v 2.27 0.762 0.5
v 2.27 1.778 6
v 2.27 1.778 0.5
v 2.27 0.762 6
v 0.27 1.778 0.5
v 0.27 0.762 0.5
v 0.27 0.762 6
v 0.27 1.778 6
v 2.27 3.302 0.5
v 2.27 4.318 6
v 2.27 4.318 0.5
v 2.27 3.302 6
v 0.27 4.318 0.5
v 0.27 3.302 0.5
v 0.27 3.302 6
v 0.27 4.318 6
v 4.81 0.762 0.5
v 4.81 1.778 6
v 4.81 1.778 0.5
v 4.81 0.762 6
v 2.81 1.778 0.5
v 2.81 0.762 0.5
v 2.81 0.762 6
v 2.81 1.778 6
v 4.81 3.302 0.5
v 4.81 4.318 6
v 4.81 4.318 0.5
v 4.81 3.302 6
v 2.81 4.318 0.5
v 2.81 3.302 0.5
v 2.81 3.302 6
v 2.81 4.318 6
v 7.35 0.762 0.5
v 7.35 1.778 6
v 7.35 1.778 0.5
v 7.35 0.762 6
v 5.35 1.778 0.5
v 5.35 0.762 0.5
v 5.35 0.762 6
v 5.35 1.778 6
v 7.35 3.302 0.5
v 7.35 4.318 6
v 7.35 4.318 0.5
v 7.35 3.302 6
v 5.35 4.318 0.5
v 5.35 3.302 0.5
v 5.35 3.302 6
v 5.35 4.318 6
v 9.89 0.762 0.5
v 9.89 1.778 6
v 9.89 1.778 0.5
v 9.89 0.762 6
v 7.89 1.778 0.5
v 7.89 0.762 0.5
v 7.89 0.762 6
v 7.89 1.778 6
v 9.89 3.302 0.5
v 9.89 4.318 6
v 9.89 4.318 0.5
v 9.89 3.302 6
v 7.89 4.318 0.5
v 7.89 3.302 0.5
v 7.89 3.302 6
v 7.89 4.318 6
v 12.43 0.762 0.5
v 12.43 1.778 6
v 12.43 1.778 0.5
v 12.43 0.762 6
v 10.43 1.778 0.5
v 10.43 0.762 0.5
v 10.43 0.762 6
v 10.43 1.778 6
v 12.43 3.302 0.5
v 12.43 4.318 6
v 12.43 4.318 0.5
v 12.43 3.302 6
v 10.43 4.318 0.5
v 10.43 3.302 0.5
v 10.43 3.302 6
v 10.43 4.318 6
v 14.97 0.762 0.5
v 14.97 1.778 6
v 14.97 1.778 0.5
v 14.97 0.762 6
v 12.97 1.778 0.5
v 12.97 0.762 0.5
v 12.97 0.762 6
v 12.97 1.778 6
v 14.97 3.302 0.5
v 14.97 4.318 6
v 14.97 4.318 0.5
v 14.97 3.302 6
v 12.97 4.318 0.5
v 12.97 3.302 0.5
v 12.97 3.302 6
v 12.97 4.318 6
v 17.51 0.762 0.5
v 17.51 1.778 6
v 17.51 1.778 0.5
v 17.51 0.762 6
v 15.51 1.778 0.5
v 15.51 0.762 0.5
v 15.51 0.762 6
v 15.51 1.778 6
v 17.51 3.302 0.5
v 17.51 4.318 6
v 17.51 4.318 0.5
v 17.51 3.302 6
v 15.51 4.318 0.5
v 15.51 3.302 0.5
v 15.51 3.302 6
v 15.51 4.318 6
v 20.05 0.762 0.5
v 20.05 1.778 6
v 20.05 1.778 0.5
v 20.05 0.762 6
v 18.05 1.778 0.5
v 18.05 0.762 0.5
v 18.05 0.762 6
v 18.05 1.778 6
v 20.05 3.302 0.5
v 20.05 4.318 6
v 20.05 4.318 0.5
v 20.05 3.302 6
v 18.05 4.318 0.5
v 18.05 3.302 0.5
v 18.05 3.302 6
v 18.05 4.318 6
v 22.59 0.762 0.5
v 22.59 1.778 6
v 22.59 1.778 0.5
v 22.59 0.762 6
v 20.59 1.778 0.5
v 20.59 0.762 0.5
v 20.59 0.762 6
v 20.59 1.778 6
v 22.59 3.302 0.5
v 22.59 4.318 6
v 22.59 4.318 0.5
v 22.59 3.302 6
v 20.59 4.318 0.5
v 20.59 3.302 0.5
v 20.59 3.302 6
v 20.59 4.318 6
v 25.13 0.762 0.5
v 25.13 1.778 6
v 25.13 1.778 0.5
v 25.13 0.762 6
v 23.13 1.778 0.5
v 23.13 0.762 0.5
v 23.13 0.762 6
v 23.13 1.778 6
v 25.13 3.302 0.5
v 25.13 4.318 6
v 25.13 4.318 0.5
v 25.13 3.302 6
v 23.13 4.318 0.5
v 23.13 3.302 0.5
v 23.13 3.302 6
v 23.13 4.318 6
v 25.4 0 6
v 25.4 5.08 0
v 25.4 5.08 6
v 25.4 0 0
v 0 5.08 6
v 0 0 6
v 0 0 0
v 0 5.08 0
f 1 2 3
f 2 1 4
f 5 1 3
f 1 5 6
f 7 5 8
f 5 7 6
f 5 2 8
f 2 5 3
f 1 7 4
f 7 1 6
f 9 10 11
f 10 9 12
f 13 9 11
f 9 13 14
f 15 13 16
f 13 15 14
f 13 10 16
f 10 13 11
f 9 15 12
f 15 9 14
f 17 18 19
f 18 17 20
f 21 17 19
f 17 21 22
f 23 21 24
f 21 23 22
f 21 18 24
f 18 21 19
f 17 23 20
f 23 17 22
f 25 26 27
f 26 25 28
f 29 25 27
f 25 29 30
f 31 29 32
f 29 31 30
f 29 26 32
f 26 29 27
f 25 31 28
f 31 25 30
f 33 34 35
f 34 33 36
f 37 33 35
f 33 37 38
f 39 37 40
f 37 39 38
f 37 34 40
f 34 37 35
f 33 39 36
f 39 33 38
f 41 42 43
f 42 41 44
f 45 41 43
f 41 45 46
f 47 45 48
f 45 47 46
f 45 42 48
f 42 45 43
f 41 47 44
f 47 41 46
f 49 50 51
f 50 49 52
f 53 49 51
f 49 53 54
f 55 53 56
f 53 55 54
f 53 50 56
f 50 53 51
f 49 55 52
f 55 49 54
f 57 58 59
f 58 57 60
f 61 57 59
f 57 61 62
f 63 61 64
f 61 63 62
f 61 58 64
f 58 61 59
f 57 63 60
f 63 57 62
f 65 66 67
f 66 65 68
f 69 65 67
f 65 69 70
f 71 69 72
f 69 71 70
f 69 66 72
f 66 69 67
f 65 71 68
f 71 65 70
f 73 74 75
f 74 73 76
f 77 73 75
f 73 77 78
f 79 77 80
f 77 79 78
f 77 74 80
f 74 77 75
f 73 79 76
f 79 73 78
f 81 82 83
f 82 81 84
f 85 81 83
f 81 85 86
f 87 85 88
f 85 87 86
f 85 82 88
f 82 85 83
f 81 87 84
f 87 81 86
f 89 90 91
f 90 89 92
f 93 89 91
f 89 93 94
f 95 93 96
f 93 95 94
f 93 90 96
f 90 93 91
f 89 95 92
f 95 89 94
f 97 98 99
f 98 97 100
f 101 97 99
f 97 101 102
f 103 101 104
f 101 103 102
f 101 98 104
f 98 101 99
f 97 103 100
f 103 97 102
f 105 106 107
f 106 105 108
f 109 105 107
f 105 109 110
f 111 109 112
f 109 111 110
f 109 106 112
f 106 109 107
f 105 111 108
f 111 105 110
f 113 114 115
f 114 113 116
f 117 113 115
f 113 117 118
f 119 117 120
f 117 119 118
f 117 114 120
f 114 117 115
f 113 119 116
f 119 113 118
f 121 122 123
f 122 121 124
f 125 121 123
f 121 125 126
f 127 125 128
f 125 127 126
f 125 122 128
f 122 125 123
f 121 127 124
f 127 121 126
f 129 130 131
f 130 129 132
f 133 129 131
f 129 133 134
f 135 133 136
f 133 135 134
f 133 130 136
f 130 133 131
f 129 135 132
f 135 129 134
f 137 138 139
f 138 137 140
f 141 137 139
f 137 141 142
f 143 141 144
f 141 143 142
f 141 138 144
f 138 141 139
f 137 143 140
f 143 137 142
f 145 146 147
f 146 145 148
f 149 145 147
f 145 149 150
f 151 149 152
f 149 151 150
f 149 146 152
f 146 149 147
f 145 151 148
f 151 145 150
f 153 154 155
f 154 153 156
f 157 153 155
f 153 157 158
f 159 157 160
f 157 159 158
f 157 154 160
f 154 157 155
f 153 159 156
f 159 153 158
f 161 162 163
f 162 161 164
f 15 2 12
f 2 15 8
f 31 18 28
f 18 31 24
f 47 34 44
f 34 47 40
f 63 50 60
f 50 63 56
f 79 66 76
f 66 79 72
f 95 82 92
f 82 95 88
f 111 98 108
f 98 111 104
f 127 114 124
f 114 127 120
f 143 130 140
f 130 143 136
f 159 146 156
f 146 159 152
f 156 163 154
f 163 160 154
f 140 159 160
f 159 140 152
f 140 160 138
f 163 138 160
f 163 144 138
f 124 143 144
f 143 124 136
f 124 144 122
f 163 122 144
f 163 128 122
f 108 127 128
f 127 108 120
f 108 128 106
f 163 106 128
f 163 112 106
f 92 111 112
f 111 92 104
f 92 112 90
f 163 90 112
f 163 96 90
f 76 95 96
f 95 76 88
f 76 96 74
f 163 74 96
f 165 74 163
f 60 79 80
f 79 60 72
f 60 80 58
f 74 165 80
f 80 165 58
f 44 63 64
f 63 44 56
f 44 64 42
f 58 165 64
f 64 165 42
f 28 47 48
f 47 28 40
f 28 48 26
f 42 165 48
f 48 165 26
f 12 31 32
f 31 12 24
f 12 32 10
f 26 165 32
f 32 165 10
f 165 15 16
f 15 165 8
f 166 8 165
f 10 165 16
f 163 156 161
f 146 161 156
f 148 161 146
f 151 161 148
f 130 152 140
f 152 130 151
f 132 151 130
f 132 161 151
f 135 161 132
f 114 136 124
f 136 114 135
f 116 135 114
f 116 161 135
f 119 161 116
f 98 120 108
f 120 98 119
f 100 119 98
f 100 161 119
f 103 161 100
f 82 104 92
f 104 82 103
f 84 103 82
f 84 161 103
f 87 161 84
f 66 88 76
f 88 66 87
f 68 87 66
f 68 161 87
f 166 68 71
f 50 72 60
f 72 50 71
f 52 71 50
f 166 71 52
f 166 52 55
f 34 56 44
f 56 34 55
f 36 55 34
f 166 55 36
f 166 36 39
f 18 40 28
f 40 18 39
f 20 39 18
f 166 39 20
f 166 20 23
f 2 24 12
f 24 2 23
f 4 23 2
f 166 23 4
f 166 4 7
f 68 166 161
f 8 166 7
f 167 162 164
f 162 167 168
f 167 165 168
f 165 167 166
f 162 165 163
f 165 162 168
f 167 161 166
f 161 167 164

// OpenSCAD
// PinHeaderCover.scad

numPinRows = 2;
numPinsInRow = 10;

blockHeight = 6;

// Pins have .1 inch centers and are .025 inch square
// but we're working in millimeters
pinLength = 0.635;
pinWidth = 0.635;
pinHoleLength = pinLength * 3.15; // ends up with decent measures for 0.4mm nozzle
//pinHoleWidth = pinWidth * 1.89; // a bit looser
pinHoleWidth = pinWidth * 1.6; // for tighter holes
//pinHoleWidth = pinWidth * 1.26; // originally
pinStepX = 2.54;
pinStepY = 2.54;
pinOffsetX = pinStepX/2;
pinOffsetY = pinStepY/2;
pinOffsetZ = 0.5+blockHeight/2;

blockLength = numPinsInRow * pinStepX;
blockWidth = numPinRows * pinStepY;

difference() {
    cube([blockLength, blockWidth, blockHeight], center=false);
    for (x=[0:numPinsInRow-1], y=[0:numPinRows-1]) {
        translate([x*pinStepX+pinOffsetX, y*pinStepY+pinOffsetY, pinOffsetZ]) {
            cube([pinHoleLength, pinHoleWidth, blockHeight], center=true);
        }
    }
}

echo(version=version());
